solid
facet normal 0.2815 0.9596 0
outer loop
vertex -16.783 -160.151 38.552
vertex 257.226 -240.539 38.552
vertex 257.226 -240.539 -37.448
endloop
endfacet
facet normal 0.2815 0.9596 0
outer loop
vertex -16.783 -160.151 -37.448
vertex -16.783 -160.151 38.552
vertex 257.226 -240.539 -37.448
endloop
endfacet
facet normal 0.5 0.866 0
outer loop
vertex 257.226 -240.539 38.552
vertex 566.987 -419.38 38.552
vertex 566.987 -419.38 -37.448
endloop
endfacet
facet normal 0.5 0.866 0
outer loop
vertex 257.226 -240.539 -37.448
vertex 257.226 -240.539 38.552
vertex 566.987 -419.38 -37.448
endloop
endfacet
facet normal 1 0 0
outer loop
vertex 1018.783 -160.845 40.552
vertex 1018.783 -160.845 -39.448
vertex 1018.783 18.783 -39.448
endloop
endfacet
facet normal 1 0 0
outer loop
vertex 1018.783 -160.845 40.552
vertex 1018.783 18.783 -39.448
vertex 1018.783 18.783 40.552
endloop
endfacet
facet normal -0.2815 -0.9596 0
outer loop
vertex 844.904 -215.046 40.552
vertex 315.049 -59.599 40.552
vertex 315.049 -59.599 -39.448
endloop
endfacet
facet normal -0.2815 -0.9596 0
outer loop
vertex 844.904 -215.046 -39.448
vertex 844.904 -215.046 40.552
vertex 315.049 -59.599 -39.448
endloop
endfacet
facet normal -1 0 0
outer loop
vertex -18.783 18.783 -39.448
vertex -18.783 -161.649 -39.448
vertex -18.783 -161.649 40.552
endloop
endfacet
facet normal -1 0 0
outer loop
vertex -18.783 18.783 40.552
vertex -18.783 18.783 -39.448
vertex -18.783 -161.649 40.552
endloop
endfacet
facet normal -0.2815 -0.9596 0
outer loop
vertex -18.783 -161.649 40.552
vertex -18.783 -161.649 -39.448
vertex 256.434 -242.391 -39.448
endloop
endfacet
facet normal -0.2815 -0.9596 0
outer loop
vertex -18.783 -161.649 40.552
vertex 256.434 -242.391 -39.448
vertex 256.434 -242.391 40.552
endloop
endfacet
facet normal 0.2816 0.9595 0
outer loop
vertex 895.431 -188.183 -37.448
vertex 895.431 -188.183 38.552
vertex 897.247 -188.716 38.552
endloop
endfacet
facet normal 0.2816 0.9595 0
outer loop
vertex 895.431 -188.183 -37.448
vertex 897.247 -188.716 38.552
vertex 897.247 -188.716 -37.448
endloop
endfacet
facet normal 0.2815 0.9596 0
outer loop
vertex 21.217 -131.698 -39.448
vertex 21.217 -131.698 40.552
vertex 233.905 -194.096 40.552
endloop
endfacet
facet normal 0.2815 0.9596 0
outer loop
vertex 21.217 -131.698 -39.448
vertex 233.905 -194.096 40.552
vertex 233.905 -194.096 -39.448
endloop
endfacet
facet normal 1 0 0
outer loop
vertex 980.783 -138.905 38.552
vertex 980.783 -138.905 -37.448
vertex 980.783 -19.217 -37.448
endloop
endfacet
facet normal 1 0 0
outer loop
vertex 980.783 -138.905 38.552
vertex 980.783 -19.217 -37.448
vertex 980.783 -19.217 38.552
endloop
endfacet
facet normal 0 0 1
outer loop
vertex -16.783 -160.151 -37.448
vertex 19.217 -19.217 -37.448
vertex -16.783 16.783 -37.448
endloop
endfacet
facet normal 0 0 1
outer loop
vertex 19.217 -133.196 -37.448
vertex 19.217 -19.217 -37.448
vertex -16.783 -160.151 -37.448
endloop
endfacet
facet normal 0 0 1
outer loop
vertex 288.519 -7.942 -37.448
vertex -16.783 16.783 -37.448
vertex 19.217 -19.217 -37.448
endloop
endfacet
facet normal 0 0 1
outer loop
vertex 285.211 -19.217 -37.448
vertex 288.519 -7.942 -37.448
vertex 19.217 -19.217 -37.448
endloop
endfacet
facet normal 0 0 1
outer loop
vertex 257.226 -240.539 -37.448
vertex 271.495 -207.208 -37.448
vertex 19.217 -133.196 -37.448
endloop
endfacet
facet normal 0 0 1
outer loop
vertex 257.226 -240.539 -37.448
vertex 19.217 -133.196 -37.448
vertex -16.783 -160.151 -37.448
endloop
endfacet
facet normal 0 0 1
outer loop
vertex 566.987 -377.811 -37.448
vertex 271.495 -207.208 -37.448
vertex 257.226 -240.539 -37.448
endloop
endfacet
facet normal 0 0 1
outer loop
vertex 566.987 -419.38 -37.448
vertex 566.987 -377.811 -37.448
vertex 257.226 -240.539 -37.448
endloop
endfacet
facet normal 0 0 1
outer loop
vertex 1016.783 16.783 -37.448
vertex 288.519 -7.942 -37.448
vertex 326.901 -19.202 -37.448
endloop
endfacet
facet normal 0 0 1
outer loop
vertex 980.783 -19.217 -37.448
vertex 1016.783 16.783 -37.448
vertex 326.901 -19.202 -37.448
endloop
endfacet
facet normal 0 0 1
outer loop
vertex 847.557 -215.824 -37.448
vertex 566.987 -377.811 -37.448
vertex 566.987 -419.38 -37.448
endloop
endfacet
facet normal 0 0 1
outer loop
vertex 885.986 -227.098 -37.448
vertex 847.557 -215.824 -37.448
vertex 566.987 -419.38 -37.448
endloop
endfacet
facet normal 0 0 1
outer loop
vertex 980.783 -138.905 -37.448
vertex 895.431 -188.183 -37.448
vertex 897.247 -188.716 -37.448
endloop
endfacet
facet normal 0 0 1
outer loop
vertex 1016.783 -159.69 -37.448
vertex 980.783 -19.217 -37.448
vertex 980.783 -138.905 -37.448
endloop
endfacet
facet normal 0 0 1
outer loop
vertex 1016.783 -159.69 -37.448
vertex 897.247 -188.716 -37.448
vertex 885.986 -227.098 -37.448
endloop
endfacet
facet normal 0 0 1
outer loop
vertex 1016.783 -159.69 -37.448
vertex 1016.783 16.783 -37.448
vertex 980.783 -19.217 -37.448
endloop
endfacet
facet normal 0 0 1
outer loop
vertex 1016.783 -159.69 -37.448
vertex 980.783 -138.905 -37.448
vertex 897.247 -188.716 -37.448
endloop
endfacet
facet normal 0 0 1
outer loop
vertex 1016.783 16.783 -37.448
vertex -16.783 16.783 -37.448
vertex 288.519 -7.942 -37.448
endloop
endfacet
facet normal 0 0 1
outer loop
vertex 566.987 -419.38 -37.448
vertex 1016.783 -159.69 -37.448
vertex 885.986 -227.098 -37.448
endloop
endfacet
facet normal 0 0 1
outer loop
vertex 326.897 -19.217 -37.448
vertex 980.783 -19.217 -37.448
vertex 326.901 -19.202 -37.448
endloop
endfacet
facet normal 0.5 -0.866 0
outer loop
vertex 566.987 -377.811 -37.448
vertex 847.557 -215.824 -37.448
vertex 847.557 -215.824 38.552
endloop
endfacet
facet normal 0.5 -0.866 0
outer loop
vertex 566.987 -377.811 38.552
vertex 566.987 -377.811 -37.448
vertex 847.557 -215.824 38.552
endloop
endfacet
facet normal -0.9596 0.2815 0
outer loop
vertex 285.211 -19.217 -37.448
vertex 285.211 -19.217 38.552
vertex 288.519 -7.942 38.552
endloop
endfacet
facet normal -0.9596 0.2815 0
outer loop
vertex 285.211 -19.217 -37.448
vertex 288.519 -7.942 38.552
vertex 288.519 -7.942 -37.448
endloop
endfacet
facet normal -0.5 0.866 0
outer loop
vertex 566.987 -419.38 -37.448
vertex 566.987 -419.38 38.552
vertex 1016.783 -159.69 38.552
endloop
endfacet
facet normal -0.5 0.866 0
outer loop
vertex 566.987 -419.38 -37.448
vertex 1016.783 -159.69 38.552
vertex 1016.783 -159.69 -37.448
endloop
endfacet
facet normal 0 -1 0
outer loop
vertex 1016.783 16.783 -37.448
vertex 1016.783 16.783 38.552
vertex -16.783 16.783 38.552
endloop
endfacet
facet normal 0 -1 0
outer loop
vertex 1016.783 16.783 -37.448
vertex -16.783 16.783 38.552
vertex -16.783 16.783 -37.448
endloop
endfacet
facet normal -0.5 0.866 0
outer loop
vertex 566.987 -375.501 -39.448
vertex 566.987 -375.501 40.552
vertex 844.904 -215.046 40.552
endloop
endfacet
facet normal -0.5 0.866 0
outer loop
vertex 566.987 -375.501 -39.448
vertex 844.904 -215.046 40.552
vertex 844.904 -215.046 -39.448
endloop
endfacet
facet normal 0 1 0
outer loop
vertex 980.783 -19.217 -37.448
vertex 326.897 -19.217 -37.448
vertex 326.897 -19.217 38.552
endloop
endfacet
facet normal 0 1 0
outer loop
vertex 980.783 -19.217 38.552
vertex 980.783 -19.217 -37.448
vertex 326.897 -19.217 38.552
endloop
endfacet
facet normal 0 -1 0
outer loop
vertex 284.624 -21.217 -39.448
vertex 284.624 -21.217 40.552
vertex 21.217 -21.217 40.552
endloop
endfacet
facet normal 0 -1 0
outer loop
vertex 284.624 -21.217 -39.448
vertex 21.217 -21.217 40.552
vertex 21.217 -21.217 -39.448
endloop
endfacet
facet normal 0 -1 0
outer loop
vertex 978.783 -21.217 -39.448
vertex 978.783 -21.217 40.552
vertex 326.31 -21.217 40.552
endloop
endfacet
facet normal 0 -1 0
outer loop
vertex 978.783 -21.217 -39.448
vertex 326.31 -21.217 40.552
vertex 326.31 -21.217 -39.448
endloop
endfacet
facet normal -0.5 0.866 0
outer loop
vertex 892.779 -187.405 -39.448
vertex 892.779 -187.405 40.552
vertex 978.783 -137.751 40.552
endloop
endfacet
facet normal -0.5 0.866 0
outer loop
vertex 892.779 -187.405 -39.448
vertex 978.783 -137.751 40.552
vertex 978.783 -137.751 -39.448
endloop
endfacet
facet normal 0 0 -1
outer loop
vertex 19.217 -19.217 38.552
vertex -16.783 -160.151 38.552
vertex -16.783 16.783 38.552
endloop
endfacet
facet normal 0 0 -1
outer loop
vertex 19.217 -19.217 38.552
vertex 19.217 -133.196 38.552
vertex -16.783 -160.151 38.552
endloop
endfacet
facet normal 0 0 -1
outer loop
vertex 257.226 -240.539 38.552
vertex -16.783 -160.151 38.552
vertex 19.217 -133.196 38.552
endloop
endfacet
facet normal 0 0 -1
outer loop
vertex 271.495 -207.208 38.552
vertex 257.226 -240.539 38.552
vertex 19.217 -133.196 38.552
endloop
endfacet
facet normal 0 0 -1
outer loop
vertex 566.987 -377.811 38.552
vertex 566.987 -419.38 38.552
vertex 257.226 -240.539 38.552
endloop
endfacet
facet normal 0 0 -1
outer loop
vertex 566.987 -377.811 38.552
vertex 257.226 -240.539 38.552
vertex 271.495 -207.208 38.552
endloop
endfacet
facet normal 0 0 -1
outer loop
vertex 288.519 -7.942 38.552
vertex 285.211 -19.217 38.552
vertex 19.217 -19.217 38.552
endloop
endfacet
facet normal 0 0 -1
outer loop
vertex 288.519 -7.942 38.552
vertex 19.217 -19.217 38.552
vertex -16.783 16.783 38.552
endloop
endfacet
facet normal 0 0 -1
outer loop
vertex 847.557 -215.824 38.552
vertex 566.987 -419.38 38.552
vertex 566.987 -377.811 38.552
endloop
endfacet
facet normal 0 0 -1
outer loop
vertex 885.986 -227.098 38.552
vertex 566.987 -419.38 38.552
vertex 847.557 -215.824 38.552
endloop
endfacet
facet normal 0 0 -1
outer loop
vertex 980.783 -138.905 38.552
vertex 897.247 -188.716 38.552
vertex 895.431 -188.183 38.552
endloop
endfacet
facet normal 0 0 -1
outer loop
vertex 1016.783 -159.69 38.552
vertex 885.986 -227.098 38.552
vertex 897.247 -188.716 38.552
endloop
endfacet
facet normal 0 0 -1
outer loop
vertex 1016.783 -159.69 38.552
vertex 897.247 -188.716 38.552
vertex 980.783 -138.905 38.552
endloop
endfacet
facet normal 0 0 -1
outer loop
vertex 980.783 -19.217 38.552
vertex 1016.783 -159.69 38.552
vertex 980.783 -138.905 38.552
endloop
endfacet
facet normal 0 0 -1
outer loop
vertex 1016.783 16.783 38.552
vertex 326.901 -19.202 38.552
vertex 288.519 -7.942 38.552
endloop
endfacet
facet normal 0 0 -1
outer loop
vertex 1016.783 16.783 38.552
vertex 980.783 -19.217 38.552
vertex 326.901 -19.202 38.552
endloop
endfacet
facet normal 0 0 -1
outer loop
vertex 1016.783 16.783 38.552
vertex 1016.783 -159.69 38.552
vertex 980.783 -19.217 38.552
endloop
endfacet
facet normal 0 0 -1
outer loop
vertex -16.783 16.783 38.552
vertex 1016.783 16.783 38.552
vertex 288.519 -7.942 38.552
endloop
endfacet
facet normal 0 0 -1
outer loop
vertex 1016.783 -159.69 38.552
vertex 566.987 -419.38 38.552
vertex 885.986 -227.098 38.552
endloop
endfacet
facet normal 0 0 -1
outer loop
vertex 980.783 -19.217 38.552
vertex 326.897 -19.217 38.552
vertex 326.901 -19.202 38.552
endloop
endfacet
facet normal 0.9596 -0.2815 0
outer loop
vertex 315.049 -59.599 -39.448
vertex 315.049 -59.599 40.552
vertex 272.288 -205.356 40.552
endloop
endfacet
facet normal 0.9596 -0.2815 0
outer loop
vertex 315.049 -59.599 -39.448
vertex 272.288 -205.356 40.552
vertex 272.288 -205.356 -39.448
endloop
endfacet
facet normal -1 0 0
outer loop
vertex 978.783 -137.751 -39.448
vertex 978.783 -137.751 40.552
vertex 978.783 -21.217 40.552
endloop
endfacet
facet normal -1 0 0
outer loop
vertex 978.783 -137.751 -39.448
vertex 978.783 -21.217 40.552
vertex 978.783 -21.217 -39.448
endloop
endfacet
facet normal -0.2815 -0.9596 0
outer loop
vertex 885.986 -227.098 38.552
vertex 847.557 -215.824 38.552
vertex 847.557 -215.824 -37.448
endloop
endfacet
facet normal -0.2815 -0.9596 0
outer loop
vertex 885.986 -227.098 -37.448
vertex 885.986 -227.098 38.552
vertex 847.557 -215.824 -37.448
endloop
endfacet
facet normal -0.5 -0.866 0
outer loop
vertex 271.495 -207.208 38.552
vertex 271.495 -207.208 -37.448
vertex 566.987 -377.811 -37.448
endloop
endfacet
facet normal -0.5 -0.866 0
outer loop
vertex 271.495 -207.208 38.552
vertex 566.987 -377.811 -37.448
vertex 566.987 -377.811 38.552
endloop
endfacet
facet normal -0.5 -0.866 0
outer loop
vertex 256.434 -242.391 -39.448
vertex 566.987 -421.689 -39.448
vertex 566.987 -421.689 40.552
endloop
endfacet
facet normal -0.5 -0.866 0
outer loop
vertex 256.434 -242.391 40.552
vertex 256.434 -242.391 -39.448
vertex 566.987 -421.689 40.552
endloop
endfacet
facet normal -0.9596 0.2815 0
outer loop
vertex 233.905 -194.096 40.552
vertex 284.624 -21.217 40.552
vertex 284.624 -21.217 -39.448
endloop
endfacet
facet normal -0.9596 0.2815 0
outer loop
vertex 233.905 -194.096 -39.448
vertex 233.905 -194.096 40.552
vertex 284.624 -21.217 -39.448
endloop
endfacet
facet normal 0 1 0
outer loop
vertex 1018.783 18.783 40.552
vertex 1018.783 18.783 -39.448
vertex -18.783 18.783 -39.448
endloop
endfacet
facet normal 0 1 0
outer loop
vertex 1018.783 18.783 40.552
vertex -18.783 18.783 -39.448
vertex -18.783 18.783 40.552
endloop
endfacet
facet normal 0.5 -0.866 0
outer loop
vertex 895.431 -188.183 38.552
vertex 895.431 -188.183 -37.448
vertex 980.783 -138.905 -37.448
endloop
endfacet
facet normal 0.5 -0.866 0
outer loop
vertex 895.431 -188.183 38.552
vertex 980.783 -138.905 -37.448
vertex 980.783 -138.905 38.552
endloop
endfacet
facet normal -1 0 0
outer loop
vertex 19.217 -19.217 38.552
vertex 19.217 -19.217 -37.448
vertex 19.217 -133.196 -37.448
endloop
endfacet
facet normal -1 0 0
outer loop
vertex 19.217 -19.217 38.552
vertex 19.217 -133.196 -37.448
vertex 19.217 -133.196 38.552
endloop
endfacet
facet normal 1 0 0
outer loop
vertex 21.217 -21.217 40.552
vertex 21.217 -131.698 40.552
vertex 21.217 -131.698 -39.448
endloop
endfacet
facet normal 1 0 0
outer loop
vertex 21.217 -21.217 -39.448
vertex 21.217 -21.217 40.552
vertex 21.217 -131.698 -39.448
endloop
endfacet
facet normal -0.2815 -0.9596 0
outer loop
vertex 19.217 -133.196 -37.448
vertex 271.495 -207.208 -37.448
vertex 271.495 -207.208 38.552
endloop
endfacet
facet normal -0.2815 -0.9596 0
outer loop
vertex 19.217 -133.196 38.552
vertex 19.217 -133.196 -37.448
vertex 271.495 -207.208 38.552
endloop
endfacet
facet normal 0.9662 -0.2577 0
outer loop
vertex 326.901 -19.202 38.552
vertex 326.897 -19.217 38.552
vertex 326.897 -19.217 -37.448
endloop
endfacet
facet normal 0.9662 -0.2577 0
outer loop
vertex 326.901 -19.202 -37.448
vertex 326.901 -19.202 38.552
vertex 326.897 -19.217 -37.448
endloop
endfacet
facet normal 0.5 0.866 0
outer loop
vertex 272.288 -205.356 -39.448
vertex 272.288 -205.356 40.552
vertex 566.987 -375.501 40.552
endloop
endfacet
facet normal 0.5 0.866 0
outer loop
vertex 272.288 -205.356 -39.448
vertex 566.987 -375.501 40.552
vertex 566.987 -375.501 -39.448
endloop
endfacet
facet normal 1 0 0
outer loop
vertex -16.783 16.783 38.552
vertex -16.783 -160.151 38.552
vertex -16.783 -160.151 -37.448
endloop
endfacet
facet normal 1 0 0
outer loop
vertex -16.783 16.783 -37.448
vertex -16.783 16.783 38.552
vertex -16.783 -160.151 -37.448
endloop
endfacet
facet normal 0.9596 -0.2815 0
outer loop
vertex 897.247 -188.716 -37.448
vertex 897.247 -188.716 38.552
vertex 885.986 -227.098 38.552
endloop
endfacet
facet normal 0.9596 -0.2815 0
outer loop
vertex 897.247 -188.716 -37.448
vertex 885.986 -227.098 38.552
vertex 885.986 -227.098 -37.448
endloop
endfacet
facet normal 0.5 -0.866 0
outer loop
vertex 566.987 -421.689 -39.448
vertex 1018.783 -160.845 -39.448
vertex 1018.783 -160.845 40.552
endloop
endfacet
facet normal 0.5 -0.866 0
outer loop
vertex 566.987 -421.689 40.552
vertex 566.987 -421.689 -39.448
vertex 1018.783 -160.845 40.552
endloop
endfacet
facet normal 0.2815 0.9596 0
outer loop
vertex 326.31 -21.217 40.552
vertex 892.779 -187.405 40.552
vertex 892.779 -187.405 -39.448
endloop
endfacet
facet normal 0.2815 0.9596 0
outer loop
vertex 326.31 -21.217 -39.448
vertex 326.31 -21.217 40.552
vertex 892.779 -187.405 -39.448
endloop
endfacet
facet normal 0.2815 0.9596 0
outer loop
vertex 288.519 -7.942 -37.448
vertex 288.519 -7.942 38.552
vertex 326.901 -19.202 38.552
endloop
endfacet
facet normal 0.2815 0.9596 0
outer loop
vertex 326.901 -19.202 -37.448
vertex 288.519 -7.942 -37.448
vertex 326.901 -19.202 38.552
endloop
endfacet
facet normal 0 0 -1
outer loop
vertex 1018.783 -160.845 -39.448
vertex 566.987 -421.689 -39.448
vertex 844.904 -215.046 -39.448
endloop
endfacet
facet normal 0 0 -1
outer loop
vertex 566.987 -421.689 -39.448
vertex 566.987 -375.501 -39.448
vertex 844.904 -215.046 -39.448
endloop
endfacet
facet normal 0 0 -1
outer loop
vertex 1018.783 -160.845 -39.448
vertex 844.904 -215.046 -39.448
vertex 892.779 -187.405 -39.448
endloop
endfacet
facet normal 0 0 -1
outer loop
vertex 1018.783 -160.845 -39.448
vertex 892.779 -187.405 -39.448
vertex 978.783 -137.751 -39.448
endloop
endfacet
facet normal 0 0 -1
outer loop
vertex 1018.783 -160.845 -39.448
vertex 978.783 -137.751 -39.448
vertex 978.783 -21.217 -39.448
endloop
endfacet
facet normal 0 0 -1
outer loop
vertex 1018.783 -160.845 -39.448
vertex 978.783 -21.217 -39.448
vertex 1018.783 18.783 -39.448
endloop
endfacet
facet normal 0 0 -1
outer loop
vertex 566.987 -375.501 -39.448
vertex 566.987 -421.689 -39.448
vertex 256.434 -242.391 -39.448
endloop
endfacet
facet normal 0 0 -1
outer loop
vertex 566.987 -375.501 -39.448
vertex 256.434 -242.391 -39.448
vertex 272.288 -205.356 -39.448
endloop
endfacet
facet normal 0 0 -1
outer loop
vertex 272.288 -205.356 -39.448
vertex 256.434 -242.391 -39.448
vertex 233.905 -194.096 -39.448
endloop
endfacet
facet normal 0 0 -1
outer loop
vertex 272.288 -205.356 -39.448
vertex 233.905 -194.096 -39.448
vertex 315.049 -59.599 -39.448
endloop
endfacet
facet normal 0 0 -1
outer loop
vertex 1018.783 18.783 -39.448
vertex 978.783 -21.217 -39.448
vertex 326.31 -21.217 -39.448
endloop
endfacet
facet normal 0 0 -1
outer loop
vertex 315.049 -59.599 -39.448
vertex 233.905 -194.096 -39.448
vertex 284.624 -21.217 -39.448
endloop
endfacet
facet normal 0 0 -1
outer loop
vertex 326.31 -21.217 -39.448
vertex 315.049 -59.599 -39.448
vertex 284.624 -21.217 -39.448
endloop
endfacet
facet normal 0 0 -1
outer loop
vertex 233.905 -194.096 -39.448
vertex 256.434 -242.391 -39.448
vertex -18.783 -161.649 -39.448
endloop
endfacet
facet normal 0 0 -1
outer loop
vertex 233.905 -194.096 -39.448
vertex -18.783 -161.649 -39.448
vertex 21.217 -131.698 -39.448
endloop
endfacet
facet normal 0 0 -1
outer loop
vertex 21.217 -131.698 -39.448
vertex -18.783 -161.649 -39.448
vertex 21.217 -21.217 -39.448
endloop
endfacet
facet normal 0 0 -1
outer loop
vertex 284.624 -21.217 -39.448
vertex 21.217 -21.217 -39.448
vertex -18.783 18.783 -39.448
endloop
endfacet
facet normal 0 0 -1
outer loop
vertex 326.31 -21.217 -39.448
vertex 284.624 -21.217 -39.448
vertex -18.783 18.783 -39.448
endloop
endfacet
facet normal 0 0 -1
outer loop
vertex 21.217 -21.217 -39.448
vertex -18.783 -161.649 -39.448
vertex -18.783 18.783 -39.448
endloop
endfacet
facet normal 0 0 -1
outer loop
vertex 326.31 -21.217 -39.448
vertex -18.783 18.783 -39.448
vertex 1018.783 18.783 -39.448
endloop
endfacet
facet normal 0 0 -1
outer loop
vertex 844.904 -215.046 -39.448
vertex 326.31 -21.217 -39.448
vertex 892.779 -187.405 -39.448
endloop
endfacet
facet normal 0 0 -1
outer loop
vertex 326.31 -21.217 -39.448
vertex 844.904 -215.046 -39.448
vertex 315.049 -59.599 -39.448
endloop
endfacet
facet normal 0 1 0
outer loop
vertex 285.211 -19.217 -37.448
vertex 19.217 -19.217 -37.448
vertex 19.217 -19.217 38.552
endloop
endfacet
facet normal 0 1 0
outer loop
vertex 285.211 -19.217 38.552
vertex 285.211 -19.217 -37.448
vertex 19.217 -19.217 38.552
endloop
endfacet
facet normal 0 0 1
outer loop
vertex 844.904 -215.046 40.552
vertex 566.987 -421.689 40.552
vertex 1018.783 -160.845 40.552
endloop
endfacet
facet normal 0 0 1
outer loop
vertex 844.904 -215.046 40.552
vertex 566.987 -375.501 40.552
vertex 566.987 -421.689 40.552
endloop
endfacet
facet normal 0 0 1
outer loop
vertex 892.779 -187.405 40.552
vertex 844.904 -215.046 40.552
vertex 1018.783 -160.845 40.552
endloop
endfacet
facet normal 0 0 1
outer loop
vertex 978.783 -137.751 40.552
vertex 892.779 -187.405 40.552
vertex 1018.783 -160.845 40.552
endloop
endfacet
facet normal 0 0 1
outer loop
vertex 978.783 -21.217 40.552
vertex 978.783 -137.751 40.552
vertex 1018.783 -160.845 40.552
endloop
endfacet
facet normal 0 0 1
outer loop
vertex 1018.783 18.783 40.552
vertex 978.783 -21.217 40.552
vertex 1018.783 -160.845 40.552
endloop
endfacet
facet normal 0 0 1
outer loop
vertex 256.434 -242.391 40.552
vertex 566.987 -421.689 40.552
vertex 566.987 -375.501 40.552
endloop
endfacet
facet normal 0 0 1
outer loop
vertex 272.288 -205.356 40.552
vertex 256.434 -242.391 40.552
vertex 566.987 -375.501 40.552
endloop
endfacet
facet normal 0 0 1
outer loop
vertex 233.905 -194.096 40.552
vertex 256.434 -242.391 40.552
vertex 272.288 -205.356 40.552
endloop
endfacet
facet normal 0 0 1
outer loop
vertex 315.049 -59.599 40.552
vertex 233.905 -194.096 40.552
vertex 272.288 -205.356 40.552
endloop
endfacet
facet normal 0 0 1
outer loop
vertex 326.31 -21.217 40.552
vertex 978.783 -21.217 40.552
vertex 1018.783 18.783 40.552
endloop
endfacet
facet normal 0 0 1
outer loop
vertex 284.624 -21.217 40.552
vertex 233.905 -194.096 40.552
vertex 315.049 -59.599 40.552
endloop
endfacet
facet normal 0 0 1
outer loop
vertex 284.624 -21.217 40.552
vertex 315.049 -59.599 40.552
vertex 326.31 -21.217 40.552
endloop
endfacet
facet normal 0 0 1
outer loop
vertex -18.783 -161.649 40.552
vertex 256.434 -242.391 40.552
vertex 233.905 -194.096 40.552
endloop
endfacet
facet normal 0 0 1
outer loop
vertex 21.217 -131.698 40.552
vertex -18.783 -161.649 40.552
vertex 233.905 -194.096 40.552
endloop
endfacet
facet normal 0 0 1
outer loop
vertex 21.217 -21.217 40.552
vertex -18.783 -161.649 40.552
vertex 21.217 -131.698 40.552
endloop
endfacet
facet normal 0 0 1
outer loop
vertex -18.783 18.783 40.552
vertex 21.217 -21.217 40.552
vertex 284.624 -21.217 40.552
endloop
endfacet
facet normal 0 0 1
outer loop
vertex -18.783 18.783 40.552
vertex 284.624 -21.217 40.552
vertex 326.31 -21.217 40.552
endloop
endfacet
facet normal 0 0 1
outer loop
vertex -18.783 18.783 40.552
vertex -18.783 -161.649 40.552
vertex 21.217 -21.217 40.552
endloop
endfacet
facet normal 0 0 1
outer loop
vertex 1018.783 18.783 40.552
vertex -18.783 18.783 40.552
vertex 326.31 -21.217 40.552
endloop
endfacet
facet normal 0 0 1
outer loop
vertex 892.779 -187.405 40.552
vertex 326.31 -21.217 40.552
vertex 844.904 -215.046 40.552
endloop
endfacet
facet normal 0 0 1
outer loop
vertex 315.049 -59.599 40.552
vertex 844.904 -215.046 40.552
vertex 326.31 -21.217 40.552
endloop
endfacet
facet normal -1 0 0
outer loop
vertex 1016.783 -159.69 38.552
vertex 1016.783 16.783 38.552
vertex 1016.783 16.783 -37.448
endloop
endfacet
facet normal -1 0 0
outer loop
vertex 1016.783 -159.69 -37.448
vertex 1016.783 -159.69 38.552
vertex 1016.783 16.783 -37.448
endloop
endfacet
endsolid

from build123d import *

# Parameters (mm, degrees)
SKETCH_6_W      = 80
SKETCH_6_H      = 40
SKETCH_6_W_2    = 76
SKETCH_6_H_2    = 36
SKETCH_14_W     = 40
SKETCH_14_H     = 80
EXTRUDE_1_DEPTH = 194
SKETCH_15_W     = 80
SKETCH_15_H     = 40
EXTRUDE_2_DEPTH = 595


with BuildPart() as part:
    # По траектории13: sweep along a curve in space
    with BuildLine() as sweep_13_path:
        Line((0, 0, 0), (1000, 0, 0))
        Line((1000, 0, 0), (1000, -150, 0))
        Line((1000, -150, 0), (566.987298108, -400, 0))
        Line((566.987298108, -400, 0), (263.878406783, -225, 0))
        Line((263.878406783, -225, 0), (0, -147.584326952, 0))
        Line((0, -147.584326952, 0), (0, 0, 0))
    # Эскиз6 → По траектории13 (sweep)
    with BuildSketch(Plane(origin=(0, 0, 0), x_dir=(0, 0, -1), z_dir=(1, 0, 0))):
        with Locations((-0.551773823, -1.216505436)):
            Rectangle(SKETCH_6_W, SKETCH_6_H)
        with Locations((-0.551773823, -1.216505436)):
            Rectangle(SKETCH_6_W_2, SKETCH_6_H_2, mode=Mode.SUBTRACT)
    sweep(path=sweep_13_path.line, transition=Transition.RIGHT)

    # Эскиз14 → Бобышка-Вытянуть1 (add)
    with BuildSketch(Plane(origin=(-33.89376203, -115.529989888, 0), x_dir=(0.9595578428480989, -0.2815115383580276, 0), z_dir=(0.2815115383580276, 0.9595578428480989, 0))):
        with Locations((299.085913187, -0.551773823)):
            Rectangle(SKETCH_14_W, SKETCH_14_H)
    extrude(amount=EXTRUDE_1_DEPTH)

    # Эскиз15 → Бобышка-Вытянуть2 (add)
    with BuildSketch(Plane(origin=(306.181390541, -89.82636629, 0), x_dir=(0, 0, -1), z_dir=(0.9595578428480989, -0.28151153835802767, 0))):
        with Locations((-0.551773823, 51.50143726)):
            Rectangle(SKETCH_15_W, SKETCH_15_H)
    extrude(amount=EXTRUDE_2_DEPTH)


solid = part.part
